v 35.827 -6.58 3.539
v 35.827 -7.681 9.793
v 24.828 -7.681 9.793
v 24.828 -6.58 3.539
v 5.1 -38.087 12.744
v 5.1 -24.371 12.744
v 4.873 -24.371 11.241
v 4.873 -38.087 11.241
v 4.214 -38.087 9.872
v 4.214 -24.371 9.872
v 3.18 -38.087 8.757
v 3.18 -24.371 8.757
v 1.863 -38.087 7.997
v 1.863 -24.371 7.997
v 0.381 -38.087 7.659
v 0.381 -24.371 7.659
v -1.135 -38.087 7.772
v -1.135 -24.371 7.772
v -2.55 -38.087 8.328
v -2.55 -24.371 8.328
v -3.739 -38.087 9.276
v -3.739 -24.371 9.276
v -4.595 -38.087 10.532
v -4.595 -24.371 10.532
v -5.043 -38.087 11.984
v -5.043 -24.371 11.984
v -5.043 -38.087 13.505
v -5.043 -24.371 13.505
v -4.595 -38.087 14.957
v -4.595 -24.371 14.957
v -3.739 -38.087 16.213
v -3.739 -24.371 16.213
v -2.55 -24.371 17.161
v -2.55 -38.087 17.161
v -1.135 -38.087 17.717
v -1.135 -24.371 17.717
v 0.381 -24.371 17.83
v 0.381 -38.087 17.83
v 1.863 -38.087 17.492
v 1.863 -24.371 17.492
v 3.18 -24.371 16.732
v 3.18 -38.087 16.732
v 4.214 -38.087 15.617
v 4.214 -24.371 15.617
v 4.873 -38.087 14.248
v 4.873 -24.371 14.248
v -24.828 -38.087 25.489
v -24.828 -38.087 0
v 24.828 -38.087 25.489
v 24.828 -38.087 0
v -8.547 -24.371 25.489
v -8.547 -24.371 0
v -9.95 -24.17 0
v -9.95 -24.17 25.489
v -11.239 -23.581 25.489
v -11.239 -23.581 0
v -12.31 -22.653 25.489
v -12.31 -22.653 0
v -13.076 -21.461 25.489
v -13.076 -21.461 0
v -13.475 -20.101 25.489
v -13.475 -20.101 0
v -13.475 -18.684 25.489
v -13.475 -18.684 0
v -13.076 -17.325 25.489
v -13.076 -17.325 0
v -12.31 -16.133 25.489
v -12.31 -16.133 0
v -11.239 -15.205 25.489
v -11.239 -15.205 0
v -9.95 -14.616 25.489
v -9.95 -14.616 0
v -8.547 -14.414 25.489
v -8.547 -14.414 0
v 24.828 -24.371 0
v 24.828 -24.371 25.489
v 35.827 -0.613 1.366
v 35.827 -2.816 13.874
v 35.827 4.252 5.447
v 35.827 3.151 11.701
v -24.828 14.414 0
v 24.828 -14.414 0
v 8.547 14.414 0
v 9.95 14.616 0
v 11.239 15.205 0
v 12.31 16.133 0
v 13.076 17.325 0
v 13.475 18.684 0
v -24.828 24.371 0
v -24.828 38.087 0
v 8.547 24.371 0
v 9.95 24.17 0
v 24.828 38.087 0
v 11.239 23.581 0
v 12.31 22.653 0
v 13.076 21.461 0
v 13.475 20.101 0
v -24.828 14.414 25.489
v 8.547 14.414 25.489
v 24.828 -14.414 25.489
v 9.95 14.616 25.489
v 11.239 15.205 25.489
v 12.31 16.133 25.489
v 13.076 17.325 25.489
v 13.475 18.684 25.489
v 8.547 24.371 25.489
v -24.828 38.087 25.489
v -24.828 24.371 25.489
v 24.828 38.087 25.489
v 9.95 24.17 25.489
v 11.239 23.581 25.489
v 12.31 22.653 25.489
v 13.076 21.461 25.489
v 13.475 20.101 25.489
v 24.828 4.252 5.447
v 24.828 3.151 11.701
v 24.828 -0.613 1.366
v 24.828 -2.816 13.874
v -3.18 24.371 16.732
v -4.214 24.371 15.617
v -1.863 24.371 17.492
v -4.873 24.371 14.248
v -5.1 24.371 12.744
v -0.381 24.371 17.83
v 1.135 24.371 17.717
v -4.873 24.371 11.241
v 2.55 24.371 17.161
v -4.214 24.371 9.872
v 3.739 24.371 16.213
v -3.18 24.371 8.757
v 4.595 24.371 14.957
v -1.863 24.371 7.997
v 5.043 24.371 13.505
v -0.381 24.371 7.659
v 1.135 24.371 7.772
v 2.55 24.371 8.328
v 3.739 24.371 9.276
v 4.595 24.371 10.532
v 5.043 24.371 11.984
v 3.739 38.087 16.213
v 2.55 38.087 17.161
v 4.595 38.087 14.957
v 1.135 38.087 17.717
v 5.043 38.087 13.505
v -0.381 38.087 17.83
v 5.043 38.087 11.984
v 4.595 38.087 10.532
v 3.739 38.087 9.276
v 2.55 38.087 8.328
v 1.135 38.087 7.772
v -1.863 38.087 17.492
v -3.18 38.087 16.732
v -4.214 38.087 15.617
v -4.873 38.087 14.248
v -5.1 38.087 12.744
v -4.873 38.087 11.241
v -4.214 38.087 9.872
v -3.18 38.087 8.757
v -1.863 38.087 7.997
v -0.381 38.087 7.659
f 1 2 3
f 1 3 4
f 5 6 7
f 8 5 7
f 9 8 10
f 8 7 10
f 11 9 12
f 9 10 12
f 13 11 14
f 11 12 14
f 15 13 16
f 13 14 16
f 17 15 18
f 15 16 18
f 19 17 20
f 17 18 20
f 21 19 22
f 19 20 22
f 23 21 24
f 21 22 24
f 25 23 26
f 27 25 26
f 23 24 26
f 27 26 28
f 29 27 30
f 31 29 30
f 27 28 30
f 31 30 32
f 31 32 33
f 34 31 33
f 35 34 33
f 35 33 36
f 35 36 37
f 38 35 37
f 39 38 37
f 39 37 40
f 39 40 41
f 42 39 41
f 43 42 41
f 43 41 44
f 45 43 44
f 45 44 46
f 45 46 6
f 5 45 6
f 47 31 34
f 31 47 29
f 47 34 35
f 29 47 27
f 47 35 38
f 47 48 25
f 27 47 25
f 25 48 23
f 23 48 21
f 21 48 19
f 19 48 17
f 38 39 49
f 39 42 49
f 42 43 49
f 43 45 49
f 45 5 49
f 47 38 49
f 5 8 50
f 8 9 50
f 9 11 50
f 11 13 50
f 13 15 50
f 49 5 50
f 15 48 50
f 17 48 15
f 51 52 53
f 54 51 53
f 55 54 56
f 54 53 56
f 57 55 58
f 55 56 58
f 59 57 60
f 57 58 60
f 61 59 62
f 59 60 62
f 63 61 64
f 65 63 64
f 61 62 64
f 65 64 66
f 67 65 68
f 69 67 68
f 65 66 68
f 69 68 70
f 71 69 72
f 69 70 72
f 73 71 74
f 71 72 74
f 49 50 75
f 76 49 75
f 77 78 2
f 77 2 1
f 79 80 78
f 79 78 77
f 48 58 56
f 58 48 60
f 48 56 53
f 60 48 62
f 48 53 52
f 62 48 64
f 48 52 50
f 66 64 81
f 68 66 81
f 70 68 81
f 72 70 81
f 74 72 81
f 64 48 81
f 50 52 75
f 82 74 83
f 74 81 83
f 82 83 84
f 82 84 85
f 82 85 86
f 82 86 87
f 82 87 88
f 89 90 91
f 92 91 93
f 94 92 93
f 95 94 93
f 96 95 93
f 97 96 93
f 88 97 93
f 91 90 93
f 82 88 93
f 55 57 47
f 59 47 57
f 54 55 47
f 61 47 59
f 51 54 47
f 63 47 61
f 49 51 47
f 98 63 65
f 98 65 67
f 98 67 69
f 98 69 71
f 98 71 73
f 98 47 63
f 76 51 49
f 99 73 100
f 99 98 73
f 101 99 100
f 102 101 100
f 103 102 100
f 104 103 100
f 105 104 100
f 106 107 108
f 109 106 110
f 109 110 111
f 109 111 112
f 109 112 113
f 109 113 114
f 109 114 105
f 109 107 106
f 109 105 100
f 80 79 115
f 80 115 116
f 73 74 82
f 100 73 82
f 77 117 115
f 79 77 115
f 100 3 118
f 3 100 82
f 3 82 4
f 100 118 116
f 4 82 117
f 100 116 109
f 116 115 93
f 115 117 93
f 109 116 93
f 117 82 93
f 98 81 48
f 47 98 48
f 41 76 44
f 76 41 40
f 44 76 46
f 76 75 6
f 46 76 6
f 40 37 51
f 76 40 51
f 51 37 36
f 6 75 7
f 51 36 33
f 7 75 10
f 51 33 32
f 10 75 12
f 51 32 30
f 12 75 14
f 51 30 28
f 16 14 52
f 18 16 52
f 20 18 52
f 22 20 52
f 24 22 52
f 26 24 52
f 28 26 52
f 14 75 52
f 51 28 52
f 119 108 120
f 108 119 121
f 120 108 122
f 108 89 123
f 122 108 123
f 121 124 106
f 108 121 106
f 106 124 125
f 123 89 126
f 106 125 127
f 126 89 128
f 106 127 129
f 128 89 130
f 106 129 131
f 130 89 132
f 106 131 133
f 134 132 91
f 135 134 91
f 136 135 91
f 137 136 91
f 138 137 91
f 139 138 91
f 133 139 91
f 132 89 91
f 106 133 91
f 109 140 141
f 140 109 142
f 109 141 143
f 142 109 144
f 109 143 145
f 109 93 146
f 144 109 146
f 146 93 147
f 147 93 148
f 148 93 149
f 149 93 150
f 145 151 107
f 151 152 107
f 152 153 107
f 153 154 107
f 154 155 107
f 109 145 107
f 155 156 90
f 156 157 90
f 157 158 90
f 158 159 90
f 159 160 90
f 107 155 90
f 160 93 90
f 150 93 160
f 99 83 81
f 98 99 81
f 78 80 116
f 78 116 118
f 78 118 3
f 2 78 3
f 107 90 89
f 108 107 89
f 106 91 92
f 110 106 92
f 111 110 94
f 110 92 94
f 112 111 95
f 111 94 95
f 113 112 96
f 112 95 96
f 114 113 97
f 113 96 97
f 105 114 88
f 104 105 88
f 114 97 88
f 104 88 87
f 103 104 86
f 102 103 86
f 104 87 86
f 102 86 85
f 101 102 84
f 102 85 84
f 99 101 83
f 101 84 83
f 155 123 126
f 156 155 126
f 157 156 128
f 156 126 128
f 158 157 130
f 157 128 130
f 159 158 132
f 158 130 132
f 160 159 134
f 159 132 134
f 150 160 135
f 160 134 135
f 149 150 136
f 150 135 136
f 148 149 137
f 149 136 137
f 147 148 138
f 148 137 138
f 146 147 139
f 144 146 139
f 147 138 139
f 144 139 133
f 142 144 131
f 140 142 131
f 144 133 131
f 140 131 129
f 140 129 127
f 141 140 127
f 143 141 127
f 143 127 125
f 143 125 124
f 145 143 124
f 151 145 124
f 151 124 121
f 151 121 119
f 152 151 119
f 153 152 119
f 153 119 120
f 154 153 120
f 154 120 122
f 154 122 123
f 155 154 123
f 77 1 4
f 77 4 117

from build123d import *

# Parameters (mm, degrees)
BOSS_EXTRUDE1_DEPTH               = 25.4889
BOSS_EXTRUDE2_DEPTH               = 10.9982
TAP_DRILL_FOR_M12X1_75_TAP1_D     = 10.2
TAP_DRILL_FOR_M12X1_75_TAP1_DEPTH = 19.05
TAP_DRILL_FOR_M12X1_75_TAP1_TIP   = 3.064389157
TAP_DRILL_FOR_M12X1_75_TAP2_D     = 10.2
TAP_DRILL_FOR_M12X1_75_TAP2_DEPTH = 19.05
TAP_DRILL_FOR_M12X1_75_TAP2_TIP   = 3.064389157


with BuildPart() as part:
    # Sketch1 → Boss-Extrude1 (new body)
    with BuildSketch(Plane.XY):
        with BuildLine():
            Line((-24.8285, -38.0873), (24.8285, -38.0873))
            Line((24.8285, -38.0873), (24.8285, -24.3713))
            Line((24.8285, -24.3713), (-8.5471, -24.3713))
            ThreePointArc((-8.5471, -24.3713), (-13.5255, -19.3929), (-8.5471, -14.4145))
            Line((-8.5471, -14.4145), (24.8285, -14.4145))
            Line((24.8285, -14.4145), (24.8285, 38.0873))
            Line((24.8285, 38.0873), (-24.8285, 38.0873))
            Line((-24.8285, 38.0873), (-24.8285, 24.3713))
            Line((-24.8285, 24.3713), (8.5471, 24.3713))
            ThreePointArc((8.5471, 24.3713), (13.5255, 19.3929), (8.5471, 14.4145))
            Line((8.5471, 14.4145), (-24.8285, 14.4145))
            Line((-24.8285, 14.4145), (-24.8285, -38.0873))
        make_face()
    extrude(amount=BOSS_EXTRUDE1_DEPTH)

    # Sketch2 → Boss-Extrude2 (add)
    with BuildSketch(Plane(origin=(24.8285, 0, 0), x_dir=(0, 0, -1), z_dir=(1, 0, 0))):
        Polygon((-11.700587864, 3.150816299), (-13.873781444, -2.815734603), (-9.79319358, -7.681050902), (-3.539412136, -6.579816299), (-1.366218556, -0.613265397), (-5.44680642, 4.252050902), align=None)
    extrude(amount=BOSS_EXTRUDE2_DEPTH)

    # Tap Drill for M12x1.75 Tap1
    with Locations(Plane(origin=(0, 38.0873, 0), x_dir=(1, 0, 0), z_dir=(0, 1, 0))):
        with Locations((0, -12.74445)):
            Hole(TAP_DRILL_FOR_M12X1_75_TAP1_D / 2, depth=TAP_DRILL_FOR_M12X1_75_TAP1_DEPTH)
            with Locations((0, 0, -(TAP_DRILL_FOR_M12X1_75_TAP1_DEPTH + TAP_DRILL_FOR_M12X1_75_TAP1_TIP / 2))):  # 118° drill point
                Cone(0, TAP_DRILL_FOR_M12X1_75_TAP1_D / 2, TAP_DRILL_FOR_M12X1_75_TAP1_TIP, mode=Mode.SUBTRACT)

    # Tap Drill for M12x1.75 Tap2
    with Locations(Plane(origin=(0, -38.0873, 0), x_dir=(-1, 0, 0), z_dir=(0, -1, 0))):
        with Locations((0, -12.74445)):
            Hole(TAP_DRILL_FOR_M12X1_75_TAP2_D / 2, depth=TAP_DRILL_FOR_M12X1_75_TAP2_DEPTH)
            with Locations((0, 0, -(TAP_DRILL_FOR_M12X1_75_TAP2_DEPTH + TAP_DRILL_FOR_M12X1_75_TAP2_TIP / 2))):  # 118° drill point
                Cone(0, TAP_DRILL_FOR_M12X1_75_TAP2_D / 2, TAP_DRILL_FOR_M12X1_75_TAP2_TIP, mode=Mode.SUBTRACT)


solid = part.part
